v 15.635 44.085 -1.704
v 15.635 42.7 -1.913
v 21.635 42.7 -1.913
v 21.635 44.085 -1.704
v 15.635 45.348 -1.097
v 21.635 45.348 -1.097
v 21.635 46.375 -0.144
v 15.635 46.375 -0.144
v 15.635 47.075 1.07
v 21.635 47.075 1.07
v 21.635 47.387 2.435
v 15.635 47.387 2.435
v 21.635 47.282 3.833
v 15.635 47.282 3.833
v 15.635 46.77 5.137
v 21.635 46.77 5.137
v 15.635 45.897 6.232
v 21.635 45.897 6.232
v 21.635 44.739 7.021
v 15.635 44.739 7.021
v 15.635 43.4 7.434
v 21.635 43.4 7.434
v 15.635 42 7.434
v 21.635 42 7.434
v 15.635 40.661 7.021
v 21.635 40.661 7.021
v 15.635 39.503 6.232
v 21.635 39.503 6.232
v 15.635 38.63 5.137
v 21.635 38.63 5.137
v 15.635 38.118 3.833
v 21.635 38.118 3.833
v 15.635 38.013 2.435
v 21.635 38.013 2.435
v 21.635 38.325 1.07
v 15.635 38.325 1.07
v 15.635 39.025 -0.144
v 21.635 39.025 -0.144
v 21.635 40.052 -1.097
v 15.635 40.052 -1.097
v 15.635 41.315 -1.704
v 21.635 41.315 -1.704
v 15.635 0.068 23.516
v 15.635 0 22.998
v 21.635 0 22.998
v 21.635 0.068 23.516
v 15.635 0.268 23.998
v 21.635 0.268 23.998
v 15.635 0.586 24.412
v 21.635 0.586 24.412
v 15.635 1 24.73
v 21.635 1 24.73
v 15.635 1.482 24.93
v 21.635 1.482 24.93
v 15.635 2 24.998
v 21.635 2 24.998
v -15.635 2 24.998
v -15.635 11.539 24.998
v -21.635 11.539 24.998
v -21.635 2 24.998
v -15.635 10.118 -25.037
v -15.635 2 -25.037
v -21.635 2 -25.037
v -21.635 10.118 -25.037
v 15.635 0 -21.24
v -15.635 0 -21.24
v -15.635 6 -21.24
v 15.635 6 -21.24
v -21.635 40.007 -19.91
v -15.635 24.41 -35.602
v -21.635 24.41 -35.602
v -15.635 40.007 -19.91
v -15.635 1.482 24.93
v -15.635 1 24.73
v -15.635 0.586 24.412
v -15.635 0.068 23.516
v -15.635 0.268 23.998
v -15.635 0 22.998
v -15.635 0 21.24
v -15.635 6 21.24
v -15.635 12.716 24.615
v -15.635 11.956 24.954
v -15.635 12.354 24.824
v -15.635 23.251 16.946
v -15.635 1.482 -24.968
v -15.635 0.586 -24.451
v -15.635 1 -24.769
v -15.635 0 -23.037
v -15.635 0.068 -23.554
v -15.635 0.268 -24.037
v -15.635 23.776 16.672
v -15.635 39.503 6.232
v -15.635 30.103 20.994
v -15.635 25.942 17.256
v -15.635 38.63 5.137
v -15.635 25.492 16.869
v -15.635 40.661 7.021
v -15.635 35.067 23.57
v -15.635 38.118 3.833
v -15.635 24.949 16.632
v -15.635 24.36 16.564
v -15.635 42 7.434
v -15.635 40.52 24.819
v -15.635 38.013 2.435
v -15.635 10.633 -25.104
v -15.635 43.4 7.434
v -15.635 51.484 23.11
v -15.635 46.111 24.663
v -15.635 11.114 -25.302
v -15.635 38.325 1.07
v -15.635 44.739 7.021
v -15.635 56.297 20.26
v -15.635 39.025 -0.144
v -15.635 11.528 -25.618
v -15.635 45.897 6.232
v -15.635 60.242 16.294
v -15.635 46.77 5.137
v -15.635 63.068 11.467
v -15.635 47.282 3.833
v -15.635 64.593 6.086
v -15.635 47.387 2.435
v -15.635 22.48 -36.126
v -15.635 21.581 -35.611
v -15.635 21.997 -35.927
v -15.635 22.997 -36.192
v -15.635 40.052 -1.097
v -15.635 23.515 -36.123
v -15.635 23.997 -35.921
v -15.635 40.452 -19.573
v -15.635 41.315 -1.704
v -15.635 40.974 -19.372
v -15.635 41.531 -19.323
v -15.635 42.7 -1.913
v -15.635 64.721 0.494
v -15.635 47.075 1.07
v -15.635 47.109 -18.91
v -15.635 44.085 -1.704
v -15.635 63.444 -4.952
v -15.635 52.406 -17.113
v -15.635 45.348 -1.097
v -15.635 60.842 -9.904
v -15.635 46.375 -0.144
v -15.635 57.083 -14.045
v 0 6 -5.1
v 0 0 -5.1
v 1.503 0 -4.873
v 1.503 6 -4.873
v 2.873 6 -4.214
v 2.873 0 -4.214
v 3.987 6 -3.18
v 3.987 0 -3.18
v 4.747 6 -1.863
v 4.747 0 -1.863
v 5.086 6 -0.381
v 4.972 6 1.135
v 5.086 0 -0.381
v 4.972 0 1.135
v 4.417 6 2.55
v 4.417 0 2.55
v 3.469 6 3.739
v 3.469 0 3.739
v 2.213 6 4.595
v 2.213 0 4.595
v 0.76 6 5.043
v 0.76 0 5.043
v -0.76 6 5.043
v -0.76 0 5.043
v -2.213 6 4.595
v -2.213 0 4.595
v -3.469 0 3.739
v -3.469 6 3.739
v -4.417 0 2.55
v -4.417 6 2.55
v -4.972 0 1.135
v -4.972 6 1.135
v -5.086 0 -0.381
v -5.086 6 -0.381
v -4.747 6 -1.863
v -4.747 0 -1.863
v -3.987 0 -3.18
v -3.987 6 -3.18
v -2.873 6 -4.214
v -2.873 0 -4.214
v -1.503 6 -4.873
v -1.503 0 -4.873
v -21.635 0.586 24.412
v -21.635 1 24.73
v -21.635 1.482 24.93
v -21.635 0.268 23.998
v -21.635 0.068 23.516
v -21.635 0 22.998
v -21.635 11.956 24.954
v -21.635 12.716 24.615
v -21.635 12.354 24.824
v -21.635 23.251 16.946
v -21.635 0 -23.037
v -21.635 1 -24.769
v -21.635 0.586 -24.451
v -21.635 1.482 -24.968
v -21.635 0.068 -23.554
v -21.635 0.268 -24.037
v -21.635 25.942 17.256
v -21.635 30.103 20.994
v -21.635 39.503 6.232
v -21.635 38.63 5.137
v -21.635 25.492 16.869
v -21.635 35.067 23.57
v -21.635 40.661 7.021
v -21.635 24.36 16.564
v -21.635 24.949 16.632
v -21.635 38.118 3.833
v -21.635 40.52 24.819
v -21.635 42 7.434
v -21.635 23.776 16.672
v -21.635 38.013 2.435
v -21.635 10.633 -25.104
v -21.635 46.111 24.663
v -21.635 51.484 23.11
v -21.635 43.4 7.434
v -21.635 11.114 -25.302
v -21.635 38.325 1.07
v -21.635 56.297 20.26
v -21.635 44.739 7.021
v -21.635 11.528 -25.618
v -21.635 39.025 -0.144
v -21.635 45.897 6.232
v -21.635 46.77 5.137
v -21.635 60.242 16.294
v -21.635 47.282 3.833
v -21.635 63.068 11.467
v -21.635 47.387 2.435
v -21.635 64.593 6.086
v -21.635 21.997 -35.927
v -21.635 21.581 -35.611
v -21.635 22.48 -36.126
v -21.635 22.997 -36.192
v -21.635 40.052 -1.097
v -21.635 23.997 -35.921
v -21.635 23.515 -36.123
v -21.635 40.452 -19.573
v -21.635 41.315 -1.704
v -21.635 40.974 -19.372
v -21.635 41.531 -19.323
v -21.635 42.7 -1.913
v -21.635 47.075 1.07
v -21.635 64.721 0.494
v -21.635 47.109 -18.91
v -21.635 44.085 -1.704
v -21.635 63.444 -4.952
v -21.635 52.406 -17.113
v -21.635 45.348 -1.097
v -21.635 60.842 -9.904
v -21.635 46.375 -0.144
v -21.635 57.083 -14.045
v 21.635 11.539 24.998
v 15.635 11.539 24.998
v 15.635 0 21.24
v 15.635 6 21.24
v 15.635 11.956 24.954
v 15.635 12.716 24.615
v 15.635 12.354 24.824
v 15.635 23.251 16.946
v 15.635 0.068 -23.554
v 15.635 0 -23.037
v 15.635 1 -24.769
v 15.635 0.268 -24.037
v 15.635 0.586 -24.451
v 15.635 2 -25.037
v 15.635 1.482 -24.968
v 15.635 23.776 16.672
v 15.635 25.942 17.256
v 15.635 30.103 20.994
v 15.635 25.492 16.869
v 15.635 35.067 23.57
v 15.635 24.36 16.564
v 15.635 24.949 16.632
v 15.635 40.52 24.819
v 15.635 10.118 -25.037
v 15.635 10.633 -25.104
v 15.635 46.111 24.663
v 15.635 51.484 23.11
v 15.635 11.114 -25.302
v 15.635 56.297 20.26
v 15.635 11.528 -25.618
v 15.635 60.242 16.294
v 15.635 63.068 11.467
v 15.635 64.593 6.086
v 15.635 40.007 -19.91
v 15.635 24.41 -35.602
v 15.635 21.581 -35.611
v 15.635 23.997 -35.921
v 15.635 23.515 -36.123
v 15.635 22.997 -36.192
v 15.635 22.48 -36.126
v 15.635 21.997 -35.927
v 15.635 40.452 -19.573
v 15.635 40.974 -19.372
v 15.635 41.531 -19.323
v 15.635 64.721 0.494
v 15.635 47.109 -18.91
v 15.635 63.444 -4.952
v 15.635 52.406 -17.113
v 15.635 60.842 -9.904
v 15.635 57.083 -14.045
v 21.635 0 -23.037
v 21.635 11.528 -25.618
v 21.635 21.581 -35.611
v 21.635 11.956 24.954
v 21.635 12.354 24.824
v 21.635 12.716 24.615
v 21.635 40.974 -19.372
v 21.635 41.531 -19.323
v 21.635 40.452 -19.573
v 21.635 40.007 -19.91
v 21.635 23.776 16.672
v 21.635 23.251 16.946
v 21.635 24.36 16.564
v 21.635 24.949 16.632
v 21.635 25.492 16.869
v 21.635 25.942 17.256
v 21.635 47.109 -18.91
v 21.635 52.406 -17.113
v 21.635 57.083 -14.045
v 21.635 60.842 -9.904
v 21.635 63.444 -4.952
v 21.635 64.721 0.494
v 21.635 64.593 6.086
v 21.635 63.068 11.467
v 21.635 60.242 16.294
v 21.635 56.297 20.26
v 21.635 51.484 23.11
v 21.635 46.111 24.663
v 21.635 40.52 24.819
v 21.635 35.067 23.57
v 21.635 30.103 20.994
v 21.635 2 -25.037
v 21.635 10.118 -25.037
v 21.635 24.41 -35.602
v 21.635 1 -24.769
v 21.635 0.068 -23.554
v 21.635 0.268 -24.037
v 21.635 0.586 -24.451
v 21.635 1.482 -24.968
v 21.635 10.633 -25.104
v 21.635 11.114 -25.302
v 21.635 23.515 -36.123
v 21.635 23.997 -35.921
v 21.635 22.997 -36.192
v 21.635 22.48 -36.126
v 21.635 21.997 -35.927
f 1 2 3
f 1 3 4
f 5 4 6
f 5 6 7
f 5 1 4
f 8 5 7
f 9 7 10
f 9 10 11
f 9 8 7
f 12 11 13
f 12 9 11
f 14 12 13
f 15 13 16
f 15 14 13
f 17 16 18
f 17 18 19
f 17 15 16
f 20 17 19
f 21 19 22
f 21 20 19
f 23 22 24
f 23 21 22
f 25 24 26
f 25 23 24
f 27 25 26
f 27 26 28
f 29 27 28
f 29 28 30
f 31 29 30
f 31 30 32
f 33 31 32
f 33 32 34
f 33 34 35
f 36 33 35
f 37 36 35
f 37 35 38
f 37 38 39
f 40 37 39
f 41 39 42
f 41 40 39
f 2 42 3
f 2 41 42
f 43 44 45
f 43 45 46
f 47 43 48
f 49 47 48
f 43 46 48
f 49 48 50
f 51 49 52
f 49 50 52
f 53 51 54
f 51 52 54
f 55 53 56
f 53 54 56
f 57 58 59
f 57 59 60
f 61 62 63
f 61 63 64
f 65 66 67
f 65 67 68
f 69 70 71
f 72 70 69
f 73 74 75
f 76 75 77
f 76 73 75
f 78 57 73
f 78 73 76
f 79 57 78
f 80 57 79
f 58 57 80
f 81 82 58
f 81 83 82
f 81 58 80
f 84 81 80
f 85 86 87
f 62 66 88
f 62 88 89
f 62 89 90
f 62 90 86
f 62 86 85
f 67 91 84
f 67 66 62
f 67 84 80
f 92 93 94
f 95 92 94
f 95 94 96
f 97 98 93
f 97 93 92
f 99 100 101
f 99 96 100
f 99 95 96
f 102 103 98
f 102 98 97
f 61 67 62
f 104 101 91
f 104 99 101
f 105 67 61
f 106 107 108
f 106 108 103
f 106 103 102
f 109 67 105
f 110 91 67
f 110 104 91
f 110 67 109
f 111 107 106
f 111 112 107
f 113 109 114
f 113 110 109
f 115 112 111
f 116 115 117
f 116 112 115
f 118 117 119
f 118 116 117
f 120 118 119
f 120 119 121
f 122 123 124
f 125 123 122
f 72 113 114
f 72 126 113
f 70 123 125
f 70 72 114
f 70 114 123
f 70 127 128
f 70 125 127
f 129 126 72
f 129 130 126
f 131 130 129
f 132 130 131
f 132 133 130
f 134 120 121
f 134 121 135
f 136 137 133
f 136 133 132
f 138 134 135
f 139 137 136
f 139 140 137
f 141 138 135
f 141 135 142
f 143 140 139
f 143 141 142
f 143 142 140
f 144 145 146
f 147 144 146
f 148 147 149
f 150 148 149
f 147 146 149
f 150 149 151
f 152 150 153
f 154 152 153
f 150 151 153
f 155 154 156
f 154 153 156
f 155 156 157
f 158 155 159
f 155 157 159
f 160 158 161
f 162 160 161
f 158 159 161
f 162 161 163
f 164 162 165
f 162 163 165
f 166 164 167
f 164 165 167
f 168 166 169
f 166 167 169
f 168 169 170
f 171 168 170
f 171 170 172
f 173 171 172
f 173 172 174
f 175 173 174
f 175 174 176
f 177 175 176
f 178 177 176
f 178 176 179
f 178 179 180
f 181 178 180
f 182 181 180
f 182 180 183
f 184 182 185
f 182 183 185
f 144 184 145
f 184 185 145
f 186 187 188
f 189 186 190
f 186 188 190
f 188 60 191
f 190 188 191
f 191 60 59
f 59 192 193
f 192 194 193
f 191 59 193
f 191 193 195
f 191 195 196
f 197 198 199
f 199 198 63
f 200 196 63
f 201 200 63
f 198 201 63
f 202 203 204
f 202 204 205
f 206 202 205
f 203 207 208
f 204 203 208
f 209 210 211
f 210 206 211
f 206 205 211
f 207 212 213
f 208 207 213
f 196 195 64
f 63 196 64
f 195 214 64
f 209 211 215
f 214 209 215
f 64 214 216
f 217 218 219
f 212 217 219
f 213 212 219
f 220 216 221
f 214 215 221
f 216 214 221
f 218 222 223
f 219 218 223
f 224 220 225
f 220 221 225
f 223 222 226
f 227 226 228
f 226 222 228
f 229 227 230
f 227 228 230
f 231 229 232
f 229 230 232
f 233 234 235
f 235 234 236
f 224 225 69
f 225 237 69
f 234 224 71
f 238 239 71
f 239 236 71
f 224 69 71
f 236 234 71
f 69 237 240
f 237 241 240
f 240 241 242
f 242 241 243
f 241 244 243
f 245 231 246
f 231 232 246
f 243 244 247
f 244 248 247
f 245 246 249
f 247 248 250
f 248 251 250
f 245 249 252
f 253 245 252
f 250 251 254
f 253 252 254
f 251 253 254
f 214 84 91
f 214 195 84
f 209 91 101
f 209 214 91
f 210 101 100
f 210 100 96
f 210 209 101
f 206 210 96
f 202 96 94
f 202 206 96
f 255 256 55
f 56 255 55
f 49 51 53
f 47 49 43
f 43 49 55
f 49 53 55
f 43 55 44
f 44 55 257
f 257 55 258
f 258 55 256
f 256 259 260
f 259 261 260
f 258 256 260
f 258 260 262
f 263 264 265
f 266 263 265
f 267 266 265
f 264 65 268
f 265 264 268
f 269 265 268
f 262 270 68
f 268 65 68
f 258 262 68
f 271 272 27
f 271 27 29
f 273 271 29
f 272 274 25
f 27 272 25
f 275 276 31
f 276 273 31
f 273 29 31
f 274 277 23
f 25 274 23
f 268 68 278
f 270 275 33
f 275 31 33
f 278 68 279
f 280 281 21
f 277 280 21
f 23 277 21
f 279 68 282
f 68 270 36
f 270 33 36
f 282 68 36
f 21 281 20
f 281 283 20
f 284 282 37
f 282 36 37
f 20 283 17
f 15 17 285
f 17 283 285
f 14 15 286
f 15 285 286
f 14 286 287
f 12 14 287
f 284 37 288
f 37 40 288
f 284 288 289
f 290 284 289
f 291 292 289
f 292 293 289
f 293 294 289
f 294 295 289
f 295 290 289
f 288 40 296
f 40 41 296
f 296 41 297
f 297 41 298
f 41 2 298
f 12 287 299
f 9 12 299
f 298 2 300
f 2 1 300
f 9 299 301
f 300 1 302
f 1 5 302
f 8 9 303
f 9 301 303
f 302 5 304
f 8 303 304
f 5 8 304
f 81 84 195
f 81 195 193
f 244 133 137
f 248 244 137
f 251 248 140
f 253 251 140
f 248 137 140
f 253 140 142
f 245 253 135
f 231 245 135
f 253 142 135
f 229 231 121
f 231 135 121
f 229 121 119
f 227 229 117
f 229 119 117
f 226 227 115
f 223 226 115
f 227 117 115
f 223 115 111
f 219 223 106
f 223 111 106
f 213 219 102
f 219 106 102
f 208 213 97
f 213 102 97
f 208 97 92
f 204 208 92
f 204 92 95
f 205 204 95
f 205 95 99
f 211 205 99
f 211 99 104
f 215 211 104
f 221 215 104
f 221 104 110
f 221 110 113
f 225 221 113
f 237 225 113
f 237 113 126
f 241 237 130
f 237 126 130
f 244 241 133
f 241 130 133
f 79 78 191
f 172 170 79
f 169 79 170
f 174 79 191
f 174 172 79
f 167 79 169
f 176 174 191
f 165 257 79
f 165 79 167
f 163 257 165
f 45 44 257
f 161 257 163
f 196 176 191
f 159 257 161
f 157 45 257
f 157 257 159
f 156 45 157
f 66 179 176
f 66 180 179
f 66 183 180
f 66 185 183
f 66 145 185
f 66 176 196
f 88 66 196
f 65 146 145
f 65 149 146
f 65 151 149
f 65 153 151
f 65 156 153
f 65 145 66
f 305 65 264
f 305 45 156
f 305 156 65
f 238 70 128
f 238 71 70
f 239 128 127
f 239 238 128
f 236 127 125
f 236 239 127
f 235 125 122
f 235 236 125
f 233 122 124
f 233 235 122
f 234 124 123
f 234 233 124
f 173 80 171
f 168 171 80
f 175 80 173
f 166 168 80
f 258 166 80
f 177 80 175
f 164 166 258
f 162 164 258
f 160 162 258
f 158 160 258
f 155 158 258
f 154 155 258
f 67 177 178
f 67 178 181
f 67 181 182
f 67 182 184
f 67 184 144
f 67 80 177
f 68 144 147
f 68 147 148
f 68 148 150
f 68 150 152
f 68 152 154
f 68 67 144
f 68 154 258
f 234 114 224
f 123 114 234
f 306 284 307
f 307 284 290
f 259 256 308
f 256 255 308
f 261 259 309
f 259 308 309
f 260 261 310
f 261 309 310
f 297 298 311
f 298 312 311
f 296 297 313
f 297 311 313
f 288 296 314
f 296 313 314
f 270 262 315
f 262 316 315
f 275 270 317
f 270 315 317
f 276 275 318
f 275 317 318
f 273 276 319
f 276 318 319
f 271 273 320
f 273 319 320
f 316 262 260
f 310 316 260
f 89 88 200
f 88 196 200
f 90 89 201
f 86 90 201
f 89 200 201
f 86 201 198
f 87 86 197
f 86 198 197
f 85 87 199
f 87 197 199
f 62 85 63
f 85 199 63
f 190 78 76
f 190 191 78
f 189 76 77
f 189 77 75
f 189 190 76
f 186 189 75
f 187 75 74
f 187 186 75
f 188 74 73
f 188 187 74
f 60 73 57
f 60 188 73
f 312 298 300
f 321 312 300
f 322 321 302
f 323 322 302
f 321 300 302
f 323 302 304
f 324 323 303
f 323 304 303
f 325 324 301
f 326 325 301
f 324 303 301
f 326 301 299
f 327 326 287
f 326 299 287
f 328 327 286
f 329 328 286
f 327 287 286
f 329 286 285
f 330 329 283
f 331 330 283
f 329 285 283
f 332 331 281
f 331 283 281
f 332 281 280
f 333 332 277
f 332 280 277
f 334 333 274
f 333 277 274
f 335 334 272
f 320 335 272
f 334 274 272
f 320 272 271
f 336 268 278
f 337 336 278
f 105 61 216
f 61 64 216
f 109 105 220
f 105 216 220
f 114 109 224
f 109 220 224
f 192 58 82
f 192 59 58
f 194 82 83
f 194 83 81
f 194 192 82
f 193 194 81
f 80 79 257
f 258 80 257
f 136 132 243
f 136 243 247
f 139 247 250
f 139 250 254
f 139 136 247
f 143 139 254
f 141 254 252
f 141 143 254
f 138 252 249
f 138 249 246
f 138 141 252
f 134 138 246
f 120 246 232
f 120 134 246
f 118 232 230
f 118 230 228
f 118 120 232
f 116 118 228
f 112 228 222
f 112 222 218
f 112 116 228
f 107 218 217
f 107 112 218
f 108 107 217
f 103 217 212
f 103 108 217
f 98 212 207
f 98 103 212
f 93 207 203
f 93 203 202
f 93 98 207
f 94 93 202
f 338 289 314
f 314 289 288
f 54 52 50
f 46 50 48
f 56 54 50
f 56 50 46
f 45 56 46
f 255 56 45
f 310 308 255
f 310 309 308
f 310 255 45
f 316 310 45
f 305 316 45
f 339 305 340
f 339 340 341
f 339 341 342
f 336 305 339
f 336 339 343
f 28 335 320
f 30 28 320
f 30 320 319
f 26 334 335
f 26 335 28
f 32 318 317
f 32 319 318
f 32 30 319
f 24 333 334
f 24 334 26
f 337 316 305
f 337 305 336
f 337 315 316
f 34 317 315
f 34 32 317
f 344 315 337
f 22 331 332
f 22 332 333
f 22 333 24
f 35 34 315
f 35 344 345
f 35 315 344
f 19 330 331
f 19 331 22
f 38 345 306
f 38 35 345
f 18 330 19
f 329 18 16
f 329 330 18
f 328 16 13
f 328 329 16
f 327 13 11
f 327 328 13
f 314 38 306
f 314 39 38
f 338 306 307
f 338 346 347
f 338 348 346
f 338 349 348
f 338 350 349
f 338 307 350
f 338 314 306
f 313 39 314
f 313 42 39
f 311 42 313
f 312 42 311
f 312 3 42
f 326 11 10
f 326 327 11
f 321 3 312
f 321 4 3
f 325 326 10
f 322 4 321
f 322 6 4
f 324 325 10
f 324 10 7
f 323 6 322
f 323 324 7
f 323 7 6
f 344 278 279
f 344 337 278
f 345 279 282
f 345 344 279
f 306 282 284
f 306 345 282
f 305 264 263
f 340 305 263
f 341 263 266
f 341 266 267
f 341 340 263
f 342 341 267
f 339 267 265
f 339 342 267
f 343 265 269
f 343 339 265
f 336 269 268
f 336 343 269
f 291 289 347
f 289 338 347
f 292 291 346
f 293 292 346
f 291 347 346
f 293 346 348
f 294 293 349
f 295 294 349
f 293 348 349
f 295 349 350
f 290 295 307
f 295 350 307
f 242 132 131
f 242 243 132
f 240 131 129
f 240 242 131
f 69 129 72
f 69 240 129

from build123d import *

# Parameters (mm, degrees)
SKETCH3_W           = 31.27
SKETCH3_H           = 42.48
BOSS_EXTRUDE1_DEPTH = 6
SKETCH4_R           = 4.7
BOSS_EXTRUDE2_DEPTH = 6
SKETCH6_R           = 5.1
CUT_EXTRUDE2_DEPTH  = 6
FILLET1_R           = 2
FILLET2_R           = 2


with BuildPart() as part:
    # Sketch3 → Boss-Extrude1 (new body)
    with BuildSketch(Plane(origin=(0, 0, 0), x_dir=(1, 0, 0), z_dir=(0, 1, 0))):
        Rectangle(SKETCH3_W, SKETCH3_H)
    extrude(amount=BOSS_EXTRUDE1_DEPTH)

    # Sketch4 → Boss-Extrude2 (add)
    with BuildSketch(Plane(origin=(15.635, 0, 0), x_dir=(0, 0, -1), z_dir=(1, 0, 0))):
        with BuildLine():
            Line((-24.997886253, 0), (25.03656642, 0))
            Line((25.03656642, 0), (25.03656642, 10.942584388))
            Line((25.03656642, 10.942584388), (37.020669589, 23))
            Line((37.020669589, 23), (19.258864986, 40.653807887))
            ThreePointArc((19.258864986, 40.653807887), (-11.905269618, 62.875361443), (-15.817481327, 24.800496669))
            Line((-15.817481327, 24.800496669), (-24.997886253, 12.19))
            Line((-24.997886253, 12.19), (-24.997886253, 0))
        make_face()
        with Locations((-2.786694922, 42.7)):
            Circle(SKETCH4_R, mode=Mode.SUBTRACT)
    boss_extrude2 = extrude(amount=BOSS_EXTRUDE2_DEPTH)

    # Mirror2: Boss-Extrude2 across plane
    add(boss_extrude2.mirror(Plane(origin=(0, 0, 0), x_dir=(0, 0, 1), z_dir=(1, 0, 0))))

    # Sketch6 → Cut-Extrude2 (cut)
    with BuildSketch(Plane.XZ):
        with Locations(Location((0, 0, 0), (0, 0, 270))):
            Circle(SKETCH6_R)
    extrude(amount=-CUT_EXTRUDE2_DEPTH, mode=Mode.SUBTRACT)

    # Fillet1
    fillet1_edges = [part.edges().sort_by_distance(p)[0] for p in [
        (-18.635, 12.19, 24.997886253),
        (-18.635, 0, 24.997886253),
        (18.635, 10.942584388, -25.03656642),
        (-18.635, 10.942584388, -25.03656642),
        (-18.635, 0, -25.03656642),
        (18.635, 0, -25.03656642),
        (18.635, 0, 24.997886253),
        (18.635, 12.19, 24.997886253),
        (18.635, 24.800496669, 15.817481327),
        (-18.635, 24.800496669, 15.817481327),
        (18.635, 23, -37.020669589),
        (-18.635, 23, -37.020669589),
    ]]
    fillet(fillet1_edges, radius=FILLET1_R)

    # Fillet2
    fillet2_edges = [part.edges().sort_by_distance(p)[0] for p in [
        (18.635, 40.653807887, -19.258864986),
        (-18.635, 40.653807887, -19.258864986),
    ]]
    fillet(fillet2_edges, radius=FILLET2_R)


solid = part.part
